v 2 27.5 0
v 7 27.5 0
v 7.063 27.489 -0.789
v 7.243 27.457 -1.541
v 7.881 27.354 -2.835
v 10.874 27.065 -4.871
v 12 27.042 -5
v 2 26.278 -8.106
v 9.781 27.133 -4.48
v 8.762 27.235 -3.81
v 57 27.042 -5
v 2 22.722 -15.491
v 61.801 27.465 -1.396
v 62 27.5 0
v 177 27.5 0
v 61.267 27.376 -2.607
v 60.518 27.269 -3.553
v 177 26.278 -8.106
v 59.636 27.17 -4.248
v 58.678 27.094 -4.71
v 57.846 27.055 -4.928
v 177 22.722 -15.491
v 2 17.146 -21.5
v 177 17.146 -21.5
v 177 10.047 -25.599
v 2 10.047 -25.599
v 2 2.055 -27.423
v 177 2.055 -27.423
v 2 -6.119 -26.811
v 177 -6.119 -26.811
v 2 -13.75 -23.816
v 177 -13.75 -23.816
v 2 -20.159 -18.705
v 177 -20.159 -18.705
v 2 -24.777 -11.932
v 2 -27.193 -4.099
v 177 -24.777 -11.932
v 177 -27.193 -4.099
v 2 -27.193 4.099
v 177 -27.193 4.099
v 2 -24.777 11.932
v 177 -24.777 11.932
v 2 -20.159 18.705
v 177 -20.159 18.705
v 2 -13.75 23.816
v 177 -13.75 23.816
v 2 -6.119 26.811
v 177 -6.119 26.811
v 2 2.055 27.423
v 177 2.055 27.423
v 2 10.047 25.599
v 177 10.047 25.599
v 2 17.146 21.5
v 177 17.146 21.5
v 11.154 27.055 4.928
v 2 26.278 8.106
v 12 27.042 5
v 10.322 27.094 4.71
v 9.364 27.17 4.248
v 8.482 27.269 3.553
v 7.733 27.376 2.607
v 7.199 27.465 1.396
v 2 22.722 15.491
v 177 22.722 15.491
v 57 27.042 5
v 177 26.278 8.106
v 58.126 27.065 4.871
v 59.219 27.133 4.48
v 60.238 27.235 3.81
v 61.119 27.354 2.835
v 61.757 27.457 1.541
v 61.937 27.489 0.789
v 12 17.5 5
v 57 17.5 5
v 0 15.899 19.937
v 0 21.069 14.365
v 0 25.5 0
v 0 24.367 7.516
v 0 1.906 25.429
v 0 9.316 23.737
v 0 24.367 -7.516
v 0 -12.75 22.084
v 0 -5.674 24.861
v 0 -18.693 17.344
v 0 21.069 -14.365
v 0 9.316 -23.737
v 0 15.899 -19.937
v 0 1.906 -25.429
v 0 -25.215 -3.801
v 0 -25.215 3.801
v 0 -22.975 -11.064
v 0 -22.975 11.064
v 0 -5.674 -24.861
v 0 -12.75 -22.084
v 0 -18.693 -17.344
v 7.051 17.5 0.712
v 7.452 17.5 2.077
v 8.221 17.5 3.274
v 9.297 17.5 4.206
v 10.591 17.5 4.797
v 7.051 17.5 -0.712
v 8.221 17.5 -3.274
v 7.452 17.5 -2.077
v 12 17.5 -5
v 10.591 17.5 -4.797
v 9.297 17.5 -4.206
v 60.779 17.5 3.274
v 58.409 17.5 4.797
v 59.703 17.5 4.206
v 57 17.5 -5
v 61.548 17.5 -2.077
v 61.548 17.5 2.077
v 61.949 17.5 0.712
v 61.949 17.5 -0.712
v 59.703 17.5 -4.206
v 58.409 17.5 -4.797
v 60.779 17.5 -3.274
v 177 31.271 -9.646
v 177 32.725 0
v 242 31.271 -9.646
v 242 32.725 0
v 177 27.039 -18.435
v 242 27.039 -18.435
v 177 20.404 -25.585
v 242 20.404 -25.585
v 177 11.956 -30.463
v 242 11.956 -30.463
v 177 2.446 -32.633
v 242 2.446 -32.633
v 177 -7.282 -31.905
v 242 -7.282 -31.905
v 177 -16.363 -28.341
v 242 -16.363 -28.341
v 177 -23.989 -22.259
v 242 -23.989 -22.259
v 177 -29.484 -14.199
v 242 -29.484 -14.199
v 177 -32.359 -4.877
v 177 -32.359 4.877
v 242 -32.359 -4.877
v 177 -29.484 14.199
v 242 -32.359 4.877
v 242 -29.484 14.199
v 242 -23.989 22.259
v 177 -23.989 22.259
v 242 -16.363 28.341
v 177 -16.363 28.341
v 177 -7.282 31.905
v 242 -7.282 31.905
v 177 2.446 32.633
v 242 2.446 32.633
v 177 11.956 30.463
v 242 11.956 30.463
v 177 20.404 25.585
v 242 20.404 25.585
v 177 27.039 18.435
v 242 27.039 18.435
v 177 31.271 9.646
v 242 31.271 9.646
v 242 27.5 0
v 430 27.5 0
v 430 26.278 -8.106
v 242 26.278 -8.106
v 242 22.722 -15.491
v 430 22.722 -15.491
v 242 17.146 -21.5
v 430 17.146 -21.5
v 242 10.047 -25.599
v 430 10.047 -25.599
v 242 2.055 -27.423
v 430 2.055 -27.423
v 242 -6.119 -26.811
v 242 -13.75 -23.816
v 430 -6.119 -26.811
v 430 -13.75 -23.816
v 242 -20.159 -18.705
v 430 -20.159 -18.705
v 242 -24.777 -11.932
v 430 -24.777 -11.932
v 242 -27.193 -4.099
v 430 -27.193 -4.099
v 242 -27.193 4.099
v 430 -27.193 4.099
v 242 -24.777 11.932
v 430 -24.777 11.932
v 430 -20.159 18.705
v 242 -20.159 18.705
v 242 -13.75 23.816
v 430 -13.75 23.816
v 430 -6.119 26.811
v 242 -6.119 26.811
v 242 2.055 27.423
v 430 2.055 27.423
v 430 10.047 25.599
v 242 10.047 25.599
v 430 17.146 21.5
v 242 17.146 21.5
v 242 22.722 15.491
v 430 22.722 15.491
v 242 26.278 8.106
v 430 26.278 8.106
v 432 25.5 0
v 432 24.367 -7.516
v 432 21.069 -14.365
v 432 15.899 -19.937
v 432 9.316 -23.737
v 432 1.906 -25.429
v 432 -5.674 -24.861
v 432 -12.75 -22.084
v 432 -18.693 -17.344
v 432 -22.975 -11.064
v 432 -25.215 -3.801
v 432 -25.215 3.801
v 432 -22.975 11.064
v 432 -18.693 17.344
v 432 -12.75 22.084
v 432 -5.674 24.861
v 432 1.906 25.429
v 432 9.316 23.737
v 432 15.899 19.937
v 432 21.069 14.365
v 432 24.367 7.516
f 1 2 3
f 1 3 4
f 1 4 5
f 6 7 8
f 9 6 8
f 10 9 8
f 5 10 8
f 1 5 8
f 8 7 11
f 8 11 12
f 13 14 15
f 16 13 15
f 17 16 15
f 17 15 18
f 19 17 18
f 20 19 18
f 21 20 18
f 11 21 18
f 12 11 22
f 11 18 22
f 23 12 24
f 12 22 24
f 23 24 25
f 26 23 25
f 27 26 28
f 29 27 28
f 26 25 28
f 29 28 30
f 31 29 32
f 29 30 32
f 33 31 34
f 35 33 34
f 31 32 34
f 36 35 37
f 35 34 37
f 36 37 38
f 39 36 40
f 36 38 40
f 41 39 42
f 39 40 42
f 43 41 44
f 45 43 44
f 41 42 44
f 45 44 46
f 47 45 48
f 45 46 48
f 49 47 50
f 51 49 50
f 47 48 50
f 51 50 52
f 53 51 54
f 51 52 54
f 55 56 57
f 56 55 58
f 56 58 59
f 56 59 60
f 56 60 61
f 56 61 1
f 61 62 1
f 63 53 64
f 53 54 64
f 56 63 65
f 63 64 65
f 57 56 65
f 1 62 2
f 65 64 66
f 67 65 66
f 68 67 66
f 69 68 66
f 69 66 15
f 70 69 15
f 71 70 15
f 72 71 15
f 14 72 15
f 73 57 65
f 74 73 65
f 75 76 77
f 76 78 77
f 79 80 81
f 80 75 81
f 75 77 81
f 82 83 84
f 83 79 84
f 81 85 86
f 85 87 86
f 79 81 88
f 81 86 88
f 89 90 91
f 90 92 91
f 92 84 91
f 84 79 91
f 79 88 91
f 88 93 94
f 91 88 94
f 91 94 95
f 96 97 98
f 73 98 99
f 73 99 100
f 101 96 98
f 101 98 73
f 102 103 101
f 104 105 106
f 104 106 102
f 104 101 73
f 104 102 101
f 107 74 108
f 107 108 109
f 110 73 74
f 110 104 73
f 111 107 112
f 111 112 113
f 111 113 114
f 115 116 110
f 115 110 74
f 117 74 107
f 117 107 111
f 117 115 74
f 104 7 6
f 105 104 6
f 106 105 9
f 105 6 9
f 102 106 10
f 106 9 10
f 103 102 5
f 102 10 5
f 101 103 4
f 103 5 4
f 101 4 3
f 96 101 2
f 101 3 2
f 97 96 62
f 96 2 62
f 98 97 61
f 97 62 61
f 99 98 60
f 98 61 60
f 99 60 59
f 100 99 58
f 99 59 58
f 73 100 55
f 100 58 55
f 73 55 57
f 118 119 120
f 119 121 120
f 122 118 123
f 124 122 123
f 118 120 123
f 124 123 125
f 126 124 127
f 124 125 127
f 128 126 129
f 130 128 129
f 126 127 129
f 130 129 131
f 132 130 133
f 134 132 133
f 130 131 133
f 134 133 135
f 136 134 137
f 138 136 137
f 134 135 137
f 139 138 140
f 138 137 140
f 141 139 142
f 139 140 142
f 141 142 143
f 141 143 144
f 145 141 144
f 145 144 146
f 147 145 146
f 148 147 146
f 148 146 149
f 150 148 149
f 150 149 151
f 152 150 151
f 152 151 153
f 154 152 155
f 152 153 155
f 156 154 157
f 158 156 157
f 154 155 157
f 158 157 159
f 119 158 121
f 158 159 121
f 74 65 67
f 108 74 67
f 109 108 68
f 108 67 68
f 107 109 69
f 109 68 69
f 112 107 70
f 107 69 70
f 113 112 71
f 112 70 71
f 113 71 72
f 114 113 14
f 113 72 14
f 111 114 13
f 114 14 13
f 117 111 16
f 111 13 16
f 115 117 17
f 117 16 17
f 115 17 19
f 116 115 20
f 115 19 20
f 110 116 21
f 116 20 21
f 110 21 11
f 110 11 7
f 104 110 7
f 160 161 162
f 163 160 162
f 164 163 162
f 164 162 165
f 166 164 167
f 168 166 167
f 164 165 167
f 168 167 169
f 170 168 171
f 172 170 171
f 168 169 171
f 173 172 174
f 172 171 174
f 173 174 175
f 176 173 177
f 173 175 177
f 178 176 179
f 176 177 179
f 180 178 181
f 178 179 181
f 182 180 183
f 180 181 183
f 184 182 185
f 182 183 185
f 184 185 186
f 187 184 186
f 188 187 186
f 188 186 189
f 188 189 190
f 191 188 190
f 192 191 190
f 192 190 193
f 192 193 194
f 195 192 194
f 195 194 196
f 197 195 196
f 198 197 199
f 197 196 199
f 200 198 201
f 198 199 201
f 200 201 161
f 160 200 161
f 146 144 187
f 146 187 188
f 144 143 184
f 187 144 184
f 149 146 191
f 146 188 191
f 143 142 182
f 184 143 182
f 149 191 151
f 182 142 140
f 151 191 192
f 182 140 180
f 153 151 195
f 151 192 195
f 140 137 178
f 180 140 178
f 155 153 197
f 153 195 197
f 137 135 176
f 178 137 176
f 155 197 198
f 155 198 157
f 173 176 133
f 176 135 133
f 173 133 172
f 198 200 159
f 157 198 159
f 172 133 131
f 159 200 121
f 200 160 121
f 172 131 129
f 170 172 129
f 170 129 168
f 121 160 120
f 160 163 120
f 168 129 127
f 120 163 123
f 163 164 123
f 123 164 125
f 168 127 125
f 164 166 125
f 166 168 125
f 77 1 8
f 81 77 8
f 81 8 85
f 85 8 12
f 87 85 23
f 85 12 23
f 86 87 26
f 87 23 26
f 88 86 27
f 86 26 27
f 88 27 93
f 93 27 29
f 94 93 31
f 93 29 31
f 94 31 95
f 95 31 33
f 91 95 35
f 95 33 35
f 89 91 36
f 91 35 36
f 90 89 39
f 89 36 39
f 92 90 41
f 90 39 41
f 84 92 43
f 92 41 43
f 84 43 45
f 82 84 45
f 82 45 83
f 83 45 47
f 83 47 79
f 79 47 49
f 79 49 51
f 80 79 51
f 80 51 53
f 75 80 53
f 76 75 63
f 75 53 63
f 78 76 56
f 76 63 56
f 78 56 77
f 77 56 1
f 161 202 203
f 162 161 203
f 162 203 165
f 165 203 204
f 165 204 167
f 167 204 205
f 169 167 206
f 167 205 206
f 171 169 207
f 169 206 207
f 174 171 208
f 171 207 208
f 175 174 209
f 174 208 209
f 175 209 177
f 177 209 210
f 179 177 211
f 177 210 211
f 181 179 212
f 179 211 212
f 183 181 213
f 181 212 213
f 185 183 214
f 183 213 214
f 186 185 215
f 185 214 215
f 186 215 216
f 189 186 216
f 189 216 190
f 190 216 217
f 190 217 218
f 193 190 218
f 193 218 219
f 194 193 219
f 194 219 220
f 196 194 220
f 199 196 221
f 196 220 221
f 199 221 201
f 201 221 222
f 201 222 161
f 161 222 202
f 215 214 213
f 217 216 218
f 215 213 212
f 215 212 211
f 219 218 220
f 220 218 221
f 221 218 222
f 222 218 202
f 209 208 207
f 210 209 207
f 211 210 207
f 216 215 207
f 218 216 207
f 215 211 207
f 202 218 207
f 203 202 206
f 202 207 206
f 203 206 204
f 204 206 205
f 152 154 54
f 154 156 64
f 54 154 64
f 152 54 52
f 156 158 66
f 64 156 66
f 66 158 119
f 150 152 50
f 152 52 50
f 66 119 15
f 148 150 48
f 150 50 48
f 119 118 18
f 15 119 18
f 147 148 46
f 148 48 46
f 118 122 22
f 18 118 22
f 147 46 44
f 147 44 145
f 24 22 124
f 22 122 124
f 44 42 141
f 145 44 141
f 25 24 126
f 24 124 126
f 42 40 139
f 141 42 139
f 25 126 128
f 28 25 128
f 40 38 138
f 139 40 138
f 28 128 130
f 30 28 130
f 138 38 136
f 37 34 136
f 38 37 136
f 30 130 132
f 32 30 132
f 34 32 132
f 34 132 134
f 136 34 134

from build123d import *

# Parameters (mm, degrees)
CHAFL_N1_SIZE         = 2
CORTAR_EXTRUIR1_DEPTH = 10


with BuildPart() as part:
    # Croquis1 → Revolución1 (revolve)
    with BuildSketch(Plane.XY):
        Polygon((0, 0), (0, 27.5), (177, 27.5), (177, 32.725), (242, 32.725), (242, 27.5), (432, 27.5), (432, 0), align=None)
    revolve(axis=Axis((432, 0, 0), (-1, 0, 0)))

    # Chaflán1
    chafl_n1_edges = [part.edges().sort_by_distance(p)[0] for p in [
        (432, -27.5, 0),
        (0, -27.5, 0),
    ]]
    chamfer(chafl_n1_edges, length=CHAFL_N1_SIZE)

    # Croquis2 → Cortar-Extruir1 (cut)
    with BuildSketch(Plane(origin=(0, 27.5, 0), x_dir=(1, 0, 0), z_dir=(0, 1, 0))):
        with BuildLine():
            Line((57, 5), (12, 5))
            ThreePointArc((12, 5), (7, 0), (12, -5))
            Line((12, -5), (57, -5))
            ThreePointArc((57, -5), (62, 0), (57, 5))
        make_face()
    extrude(amount=-CORTAR_EXTRUIR1_DEPTH, mode=Mode.SUBTRACT)


solid = part.part
